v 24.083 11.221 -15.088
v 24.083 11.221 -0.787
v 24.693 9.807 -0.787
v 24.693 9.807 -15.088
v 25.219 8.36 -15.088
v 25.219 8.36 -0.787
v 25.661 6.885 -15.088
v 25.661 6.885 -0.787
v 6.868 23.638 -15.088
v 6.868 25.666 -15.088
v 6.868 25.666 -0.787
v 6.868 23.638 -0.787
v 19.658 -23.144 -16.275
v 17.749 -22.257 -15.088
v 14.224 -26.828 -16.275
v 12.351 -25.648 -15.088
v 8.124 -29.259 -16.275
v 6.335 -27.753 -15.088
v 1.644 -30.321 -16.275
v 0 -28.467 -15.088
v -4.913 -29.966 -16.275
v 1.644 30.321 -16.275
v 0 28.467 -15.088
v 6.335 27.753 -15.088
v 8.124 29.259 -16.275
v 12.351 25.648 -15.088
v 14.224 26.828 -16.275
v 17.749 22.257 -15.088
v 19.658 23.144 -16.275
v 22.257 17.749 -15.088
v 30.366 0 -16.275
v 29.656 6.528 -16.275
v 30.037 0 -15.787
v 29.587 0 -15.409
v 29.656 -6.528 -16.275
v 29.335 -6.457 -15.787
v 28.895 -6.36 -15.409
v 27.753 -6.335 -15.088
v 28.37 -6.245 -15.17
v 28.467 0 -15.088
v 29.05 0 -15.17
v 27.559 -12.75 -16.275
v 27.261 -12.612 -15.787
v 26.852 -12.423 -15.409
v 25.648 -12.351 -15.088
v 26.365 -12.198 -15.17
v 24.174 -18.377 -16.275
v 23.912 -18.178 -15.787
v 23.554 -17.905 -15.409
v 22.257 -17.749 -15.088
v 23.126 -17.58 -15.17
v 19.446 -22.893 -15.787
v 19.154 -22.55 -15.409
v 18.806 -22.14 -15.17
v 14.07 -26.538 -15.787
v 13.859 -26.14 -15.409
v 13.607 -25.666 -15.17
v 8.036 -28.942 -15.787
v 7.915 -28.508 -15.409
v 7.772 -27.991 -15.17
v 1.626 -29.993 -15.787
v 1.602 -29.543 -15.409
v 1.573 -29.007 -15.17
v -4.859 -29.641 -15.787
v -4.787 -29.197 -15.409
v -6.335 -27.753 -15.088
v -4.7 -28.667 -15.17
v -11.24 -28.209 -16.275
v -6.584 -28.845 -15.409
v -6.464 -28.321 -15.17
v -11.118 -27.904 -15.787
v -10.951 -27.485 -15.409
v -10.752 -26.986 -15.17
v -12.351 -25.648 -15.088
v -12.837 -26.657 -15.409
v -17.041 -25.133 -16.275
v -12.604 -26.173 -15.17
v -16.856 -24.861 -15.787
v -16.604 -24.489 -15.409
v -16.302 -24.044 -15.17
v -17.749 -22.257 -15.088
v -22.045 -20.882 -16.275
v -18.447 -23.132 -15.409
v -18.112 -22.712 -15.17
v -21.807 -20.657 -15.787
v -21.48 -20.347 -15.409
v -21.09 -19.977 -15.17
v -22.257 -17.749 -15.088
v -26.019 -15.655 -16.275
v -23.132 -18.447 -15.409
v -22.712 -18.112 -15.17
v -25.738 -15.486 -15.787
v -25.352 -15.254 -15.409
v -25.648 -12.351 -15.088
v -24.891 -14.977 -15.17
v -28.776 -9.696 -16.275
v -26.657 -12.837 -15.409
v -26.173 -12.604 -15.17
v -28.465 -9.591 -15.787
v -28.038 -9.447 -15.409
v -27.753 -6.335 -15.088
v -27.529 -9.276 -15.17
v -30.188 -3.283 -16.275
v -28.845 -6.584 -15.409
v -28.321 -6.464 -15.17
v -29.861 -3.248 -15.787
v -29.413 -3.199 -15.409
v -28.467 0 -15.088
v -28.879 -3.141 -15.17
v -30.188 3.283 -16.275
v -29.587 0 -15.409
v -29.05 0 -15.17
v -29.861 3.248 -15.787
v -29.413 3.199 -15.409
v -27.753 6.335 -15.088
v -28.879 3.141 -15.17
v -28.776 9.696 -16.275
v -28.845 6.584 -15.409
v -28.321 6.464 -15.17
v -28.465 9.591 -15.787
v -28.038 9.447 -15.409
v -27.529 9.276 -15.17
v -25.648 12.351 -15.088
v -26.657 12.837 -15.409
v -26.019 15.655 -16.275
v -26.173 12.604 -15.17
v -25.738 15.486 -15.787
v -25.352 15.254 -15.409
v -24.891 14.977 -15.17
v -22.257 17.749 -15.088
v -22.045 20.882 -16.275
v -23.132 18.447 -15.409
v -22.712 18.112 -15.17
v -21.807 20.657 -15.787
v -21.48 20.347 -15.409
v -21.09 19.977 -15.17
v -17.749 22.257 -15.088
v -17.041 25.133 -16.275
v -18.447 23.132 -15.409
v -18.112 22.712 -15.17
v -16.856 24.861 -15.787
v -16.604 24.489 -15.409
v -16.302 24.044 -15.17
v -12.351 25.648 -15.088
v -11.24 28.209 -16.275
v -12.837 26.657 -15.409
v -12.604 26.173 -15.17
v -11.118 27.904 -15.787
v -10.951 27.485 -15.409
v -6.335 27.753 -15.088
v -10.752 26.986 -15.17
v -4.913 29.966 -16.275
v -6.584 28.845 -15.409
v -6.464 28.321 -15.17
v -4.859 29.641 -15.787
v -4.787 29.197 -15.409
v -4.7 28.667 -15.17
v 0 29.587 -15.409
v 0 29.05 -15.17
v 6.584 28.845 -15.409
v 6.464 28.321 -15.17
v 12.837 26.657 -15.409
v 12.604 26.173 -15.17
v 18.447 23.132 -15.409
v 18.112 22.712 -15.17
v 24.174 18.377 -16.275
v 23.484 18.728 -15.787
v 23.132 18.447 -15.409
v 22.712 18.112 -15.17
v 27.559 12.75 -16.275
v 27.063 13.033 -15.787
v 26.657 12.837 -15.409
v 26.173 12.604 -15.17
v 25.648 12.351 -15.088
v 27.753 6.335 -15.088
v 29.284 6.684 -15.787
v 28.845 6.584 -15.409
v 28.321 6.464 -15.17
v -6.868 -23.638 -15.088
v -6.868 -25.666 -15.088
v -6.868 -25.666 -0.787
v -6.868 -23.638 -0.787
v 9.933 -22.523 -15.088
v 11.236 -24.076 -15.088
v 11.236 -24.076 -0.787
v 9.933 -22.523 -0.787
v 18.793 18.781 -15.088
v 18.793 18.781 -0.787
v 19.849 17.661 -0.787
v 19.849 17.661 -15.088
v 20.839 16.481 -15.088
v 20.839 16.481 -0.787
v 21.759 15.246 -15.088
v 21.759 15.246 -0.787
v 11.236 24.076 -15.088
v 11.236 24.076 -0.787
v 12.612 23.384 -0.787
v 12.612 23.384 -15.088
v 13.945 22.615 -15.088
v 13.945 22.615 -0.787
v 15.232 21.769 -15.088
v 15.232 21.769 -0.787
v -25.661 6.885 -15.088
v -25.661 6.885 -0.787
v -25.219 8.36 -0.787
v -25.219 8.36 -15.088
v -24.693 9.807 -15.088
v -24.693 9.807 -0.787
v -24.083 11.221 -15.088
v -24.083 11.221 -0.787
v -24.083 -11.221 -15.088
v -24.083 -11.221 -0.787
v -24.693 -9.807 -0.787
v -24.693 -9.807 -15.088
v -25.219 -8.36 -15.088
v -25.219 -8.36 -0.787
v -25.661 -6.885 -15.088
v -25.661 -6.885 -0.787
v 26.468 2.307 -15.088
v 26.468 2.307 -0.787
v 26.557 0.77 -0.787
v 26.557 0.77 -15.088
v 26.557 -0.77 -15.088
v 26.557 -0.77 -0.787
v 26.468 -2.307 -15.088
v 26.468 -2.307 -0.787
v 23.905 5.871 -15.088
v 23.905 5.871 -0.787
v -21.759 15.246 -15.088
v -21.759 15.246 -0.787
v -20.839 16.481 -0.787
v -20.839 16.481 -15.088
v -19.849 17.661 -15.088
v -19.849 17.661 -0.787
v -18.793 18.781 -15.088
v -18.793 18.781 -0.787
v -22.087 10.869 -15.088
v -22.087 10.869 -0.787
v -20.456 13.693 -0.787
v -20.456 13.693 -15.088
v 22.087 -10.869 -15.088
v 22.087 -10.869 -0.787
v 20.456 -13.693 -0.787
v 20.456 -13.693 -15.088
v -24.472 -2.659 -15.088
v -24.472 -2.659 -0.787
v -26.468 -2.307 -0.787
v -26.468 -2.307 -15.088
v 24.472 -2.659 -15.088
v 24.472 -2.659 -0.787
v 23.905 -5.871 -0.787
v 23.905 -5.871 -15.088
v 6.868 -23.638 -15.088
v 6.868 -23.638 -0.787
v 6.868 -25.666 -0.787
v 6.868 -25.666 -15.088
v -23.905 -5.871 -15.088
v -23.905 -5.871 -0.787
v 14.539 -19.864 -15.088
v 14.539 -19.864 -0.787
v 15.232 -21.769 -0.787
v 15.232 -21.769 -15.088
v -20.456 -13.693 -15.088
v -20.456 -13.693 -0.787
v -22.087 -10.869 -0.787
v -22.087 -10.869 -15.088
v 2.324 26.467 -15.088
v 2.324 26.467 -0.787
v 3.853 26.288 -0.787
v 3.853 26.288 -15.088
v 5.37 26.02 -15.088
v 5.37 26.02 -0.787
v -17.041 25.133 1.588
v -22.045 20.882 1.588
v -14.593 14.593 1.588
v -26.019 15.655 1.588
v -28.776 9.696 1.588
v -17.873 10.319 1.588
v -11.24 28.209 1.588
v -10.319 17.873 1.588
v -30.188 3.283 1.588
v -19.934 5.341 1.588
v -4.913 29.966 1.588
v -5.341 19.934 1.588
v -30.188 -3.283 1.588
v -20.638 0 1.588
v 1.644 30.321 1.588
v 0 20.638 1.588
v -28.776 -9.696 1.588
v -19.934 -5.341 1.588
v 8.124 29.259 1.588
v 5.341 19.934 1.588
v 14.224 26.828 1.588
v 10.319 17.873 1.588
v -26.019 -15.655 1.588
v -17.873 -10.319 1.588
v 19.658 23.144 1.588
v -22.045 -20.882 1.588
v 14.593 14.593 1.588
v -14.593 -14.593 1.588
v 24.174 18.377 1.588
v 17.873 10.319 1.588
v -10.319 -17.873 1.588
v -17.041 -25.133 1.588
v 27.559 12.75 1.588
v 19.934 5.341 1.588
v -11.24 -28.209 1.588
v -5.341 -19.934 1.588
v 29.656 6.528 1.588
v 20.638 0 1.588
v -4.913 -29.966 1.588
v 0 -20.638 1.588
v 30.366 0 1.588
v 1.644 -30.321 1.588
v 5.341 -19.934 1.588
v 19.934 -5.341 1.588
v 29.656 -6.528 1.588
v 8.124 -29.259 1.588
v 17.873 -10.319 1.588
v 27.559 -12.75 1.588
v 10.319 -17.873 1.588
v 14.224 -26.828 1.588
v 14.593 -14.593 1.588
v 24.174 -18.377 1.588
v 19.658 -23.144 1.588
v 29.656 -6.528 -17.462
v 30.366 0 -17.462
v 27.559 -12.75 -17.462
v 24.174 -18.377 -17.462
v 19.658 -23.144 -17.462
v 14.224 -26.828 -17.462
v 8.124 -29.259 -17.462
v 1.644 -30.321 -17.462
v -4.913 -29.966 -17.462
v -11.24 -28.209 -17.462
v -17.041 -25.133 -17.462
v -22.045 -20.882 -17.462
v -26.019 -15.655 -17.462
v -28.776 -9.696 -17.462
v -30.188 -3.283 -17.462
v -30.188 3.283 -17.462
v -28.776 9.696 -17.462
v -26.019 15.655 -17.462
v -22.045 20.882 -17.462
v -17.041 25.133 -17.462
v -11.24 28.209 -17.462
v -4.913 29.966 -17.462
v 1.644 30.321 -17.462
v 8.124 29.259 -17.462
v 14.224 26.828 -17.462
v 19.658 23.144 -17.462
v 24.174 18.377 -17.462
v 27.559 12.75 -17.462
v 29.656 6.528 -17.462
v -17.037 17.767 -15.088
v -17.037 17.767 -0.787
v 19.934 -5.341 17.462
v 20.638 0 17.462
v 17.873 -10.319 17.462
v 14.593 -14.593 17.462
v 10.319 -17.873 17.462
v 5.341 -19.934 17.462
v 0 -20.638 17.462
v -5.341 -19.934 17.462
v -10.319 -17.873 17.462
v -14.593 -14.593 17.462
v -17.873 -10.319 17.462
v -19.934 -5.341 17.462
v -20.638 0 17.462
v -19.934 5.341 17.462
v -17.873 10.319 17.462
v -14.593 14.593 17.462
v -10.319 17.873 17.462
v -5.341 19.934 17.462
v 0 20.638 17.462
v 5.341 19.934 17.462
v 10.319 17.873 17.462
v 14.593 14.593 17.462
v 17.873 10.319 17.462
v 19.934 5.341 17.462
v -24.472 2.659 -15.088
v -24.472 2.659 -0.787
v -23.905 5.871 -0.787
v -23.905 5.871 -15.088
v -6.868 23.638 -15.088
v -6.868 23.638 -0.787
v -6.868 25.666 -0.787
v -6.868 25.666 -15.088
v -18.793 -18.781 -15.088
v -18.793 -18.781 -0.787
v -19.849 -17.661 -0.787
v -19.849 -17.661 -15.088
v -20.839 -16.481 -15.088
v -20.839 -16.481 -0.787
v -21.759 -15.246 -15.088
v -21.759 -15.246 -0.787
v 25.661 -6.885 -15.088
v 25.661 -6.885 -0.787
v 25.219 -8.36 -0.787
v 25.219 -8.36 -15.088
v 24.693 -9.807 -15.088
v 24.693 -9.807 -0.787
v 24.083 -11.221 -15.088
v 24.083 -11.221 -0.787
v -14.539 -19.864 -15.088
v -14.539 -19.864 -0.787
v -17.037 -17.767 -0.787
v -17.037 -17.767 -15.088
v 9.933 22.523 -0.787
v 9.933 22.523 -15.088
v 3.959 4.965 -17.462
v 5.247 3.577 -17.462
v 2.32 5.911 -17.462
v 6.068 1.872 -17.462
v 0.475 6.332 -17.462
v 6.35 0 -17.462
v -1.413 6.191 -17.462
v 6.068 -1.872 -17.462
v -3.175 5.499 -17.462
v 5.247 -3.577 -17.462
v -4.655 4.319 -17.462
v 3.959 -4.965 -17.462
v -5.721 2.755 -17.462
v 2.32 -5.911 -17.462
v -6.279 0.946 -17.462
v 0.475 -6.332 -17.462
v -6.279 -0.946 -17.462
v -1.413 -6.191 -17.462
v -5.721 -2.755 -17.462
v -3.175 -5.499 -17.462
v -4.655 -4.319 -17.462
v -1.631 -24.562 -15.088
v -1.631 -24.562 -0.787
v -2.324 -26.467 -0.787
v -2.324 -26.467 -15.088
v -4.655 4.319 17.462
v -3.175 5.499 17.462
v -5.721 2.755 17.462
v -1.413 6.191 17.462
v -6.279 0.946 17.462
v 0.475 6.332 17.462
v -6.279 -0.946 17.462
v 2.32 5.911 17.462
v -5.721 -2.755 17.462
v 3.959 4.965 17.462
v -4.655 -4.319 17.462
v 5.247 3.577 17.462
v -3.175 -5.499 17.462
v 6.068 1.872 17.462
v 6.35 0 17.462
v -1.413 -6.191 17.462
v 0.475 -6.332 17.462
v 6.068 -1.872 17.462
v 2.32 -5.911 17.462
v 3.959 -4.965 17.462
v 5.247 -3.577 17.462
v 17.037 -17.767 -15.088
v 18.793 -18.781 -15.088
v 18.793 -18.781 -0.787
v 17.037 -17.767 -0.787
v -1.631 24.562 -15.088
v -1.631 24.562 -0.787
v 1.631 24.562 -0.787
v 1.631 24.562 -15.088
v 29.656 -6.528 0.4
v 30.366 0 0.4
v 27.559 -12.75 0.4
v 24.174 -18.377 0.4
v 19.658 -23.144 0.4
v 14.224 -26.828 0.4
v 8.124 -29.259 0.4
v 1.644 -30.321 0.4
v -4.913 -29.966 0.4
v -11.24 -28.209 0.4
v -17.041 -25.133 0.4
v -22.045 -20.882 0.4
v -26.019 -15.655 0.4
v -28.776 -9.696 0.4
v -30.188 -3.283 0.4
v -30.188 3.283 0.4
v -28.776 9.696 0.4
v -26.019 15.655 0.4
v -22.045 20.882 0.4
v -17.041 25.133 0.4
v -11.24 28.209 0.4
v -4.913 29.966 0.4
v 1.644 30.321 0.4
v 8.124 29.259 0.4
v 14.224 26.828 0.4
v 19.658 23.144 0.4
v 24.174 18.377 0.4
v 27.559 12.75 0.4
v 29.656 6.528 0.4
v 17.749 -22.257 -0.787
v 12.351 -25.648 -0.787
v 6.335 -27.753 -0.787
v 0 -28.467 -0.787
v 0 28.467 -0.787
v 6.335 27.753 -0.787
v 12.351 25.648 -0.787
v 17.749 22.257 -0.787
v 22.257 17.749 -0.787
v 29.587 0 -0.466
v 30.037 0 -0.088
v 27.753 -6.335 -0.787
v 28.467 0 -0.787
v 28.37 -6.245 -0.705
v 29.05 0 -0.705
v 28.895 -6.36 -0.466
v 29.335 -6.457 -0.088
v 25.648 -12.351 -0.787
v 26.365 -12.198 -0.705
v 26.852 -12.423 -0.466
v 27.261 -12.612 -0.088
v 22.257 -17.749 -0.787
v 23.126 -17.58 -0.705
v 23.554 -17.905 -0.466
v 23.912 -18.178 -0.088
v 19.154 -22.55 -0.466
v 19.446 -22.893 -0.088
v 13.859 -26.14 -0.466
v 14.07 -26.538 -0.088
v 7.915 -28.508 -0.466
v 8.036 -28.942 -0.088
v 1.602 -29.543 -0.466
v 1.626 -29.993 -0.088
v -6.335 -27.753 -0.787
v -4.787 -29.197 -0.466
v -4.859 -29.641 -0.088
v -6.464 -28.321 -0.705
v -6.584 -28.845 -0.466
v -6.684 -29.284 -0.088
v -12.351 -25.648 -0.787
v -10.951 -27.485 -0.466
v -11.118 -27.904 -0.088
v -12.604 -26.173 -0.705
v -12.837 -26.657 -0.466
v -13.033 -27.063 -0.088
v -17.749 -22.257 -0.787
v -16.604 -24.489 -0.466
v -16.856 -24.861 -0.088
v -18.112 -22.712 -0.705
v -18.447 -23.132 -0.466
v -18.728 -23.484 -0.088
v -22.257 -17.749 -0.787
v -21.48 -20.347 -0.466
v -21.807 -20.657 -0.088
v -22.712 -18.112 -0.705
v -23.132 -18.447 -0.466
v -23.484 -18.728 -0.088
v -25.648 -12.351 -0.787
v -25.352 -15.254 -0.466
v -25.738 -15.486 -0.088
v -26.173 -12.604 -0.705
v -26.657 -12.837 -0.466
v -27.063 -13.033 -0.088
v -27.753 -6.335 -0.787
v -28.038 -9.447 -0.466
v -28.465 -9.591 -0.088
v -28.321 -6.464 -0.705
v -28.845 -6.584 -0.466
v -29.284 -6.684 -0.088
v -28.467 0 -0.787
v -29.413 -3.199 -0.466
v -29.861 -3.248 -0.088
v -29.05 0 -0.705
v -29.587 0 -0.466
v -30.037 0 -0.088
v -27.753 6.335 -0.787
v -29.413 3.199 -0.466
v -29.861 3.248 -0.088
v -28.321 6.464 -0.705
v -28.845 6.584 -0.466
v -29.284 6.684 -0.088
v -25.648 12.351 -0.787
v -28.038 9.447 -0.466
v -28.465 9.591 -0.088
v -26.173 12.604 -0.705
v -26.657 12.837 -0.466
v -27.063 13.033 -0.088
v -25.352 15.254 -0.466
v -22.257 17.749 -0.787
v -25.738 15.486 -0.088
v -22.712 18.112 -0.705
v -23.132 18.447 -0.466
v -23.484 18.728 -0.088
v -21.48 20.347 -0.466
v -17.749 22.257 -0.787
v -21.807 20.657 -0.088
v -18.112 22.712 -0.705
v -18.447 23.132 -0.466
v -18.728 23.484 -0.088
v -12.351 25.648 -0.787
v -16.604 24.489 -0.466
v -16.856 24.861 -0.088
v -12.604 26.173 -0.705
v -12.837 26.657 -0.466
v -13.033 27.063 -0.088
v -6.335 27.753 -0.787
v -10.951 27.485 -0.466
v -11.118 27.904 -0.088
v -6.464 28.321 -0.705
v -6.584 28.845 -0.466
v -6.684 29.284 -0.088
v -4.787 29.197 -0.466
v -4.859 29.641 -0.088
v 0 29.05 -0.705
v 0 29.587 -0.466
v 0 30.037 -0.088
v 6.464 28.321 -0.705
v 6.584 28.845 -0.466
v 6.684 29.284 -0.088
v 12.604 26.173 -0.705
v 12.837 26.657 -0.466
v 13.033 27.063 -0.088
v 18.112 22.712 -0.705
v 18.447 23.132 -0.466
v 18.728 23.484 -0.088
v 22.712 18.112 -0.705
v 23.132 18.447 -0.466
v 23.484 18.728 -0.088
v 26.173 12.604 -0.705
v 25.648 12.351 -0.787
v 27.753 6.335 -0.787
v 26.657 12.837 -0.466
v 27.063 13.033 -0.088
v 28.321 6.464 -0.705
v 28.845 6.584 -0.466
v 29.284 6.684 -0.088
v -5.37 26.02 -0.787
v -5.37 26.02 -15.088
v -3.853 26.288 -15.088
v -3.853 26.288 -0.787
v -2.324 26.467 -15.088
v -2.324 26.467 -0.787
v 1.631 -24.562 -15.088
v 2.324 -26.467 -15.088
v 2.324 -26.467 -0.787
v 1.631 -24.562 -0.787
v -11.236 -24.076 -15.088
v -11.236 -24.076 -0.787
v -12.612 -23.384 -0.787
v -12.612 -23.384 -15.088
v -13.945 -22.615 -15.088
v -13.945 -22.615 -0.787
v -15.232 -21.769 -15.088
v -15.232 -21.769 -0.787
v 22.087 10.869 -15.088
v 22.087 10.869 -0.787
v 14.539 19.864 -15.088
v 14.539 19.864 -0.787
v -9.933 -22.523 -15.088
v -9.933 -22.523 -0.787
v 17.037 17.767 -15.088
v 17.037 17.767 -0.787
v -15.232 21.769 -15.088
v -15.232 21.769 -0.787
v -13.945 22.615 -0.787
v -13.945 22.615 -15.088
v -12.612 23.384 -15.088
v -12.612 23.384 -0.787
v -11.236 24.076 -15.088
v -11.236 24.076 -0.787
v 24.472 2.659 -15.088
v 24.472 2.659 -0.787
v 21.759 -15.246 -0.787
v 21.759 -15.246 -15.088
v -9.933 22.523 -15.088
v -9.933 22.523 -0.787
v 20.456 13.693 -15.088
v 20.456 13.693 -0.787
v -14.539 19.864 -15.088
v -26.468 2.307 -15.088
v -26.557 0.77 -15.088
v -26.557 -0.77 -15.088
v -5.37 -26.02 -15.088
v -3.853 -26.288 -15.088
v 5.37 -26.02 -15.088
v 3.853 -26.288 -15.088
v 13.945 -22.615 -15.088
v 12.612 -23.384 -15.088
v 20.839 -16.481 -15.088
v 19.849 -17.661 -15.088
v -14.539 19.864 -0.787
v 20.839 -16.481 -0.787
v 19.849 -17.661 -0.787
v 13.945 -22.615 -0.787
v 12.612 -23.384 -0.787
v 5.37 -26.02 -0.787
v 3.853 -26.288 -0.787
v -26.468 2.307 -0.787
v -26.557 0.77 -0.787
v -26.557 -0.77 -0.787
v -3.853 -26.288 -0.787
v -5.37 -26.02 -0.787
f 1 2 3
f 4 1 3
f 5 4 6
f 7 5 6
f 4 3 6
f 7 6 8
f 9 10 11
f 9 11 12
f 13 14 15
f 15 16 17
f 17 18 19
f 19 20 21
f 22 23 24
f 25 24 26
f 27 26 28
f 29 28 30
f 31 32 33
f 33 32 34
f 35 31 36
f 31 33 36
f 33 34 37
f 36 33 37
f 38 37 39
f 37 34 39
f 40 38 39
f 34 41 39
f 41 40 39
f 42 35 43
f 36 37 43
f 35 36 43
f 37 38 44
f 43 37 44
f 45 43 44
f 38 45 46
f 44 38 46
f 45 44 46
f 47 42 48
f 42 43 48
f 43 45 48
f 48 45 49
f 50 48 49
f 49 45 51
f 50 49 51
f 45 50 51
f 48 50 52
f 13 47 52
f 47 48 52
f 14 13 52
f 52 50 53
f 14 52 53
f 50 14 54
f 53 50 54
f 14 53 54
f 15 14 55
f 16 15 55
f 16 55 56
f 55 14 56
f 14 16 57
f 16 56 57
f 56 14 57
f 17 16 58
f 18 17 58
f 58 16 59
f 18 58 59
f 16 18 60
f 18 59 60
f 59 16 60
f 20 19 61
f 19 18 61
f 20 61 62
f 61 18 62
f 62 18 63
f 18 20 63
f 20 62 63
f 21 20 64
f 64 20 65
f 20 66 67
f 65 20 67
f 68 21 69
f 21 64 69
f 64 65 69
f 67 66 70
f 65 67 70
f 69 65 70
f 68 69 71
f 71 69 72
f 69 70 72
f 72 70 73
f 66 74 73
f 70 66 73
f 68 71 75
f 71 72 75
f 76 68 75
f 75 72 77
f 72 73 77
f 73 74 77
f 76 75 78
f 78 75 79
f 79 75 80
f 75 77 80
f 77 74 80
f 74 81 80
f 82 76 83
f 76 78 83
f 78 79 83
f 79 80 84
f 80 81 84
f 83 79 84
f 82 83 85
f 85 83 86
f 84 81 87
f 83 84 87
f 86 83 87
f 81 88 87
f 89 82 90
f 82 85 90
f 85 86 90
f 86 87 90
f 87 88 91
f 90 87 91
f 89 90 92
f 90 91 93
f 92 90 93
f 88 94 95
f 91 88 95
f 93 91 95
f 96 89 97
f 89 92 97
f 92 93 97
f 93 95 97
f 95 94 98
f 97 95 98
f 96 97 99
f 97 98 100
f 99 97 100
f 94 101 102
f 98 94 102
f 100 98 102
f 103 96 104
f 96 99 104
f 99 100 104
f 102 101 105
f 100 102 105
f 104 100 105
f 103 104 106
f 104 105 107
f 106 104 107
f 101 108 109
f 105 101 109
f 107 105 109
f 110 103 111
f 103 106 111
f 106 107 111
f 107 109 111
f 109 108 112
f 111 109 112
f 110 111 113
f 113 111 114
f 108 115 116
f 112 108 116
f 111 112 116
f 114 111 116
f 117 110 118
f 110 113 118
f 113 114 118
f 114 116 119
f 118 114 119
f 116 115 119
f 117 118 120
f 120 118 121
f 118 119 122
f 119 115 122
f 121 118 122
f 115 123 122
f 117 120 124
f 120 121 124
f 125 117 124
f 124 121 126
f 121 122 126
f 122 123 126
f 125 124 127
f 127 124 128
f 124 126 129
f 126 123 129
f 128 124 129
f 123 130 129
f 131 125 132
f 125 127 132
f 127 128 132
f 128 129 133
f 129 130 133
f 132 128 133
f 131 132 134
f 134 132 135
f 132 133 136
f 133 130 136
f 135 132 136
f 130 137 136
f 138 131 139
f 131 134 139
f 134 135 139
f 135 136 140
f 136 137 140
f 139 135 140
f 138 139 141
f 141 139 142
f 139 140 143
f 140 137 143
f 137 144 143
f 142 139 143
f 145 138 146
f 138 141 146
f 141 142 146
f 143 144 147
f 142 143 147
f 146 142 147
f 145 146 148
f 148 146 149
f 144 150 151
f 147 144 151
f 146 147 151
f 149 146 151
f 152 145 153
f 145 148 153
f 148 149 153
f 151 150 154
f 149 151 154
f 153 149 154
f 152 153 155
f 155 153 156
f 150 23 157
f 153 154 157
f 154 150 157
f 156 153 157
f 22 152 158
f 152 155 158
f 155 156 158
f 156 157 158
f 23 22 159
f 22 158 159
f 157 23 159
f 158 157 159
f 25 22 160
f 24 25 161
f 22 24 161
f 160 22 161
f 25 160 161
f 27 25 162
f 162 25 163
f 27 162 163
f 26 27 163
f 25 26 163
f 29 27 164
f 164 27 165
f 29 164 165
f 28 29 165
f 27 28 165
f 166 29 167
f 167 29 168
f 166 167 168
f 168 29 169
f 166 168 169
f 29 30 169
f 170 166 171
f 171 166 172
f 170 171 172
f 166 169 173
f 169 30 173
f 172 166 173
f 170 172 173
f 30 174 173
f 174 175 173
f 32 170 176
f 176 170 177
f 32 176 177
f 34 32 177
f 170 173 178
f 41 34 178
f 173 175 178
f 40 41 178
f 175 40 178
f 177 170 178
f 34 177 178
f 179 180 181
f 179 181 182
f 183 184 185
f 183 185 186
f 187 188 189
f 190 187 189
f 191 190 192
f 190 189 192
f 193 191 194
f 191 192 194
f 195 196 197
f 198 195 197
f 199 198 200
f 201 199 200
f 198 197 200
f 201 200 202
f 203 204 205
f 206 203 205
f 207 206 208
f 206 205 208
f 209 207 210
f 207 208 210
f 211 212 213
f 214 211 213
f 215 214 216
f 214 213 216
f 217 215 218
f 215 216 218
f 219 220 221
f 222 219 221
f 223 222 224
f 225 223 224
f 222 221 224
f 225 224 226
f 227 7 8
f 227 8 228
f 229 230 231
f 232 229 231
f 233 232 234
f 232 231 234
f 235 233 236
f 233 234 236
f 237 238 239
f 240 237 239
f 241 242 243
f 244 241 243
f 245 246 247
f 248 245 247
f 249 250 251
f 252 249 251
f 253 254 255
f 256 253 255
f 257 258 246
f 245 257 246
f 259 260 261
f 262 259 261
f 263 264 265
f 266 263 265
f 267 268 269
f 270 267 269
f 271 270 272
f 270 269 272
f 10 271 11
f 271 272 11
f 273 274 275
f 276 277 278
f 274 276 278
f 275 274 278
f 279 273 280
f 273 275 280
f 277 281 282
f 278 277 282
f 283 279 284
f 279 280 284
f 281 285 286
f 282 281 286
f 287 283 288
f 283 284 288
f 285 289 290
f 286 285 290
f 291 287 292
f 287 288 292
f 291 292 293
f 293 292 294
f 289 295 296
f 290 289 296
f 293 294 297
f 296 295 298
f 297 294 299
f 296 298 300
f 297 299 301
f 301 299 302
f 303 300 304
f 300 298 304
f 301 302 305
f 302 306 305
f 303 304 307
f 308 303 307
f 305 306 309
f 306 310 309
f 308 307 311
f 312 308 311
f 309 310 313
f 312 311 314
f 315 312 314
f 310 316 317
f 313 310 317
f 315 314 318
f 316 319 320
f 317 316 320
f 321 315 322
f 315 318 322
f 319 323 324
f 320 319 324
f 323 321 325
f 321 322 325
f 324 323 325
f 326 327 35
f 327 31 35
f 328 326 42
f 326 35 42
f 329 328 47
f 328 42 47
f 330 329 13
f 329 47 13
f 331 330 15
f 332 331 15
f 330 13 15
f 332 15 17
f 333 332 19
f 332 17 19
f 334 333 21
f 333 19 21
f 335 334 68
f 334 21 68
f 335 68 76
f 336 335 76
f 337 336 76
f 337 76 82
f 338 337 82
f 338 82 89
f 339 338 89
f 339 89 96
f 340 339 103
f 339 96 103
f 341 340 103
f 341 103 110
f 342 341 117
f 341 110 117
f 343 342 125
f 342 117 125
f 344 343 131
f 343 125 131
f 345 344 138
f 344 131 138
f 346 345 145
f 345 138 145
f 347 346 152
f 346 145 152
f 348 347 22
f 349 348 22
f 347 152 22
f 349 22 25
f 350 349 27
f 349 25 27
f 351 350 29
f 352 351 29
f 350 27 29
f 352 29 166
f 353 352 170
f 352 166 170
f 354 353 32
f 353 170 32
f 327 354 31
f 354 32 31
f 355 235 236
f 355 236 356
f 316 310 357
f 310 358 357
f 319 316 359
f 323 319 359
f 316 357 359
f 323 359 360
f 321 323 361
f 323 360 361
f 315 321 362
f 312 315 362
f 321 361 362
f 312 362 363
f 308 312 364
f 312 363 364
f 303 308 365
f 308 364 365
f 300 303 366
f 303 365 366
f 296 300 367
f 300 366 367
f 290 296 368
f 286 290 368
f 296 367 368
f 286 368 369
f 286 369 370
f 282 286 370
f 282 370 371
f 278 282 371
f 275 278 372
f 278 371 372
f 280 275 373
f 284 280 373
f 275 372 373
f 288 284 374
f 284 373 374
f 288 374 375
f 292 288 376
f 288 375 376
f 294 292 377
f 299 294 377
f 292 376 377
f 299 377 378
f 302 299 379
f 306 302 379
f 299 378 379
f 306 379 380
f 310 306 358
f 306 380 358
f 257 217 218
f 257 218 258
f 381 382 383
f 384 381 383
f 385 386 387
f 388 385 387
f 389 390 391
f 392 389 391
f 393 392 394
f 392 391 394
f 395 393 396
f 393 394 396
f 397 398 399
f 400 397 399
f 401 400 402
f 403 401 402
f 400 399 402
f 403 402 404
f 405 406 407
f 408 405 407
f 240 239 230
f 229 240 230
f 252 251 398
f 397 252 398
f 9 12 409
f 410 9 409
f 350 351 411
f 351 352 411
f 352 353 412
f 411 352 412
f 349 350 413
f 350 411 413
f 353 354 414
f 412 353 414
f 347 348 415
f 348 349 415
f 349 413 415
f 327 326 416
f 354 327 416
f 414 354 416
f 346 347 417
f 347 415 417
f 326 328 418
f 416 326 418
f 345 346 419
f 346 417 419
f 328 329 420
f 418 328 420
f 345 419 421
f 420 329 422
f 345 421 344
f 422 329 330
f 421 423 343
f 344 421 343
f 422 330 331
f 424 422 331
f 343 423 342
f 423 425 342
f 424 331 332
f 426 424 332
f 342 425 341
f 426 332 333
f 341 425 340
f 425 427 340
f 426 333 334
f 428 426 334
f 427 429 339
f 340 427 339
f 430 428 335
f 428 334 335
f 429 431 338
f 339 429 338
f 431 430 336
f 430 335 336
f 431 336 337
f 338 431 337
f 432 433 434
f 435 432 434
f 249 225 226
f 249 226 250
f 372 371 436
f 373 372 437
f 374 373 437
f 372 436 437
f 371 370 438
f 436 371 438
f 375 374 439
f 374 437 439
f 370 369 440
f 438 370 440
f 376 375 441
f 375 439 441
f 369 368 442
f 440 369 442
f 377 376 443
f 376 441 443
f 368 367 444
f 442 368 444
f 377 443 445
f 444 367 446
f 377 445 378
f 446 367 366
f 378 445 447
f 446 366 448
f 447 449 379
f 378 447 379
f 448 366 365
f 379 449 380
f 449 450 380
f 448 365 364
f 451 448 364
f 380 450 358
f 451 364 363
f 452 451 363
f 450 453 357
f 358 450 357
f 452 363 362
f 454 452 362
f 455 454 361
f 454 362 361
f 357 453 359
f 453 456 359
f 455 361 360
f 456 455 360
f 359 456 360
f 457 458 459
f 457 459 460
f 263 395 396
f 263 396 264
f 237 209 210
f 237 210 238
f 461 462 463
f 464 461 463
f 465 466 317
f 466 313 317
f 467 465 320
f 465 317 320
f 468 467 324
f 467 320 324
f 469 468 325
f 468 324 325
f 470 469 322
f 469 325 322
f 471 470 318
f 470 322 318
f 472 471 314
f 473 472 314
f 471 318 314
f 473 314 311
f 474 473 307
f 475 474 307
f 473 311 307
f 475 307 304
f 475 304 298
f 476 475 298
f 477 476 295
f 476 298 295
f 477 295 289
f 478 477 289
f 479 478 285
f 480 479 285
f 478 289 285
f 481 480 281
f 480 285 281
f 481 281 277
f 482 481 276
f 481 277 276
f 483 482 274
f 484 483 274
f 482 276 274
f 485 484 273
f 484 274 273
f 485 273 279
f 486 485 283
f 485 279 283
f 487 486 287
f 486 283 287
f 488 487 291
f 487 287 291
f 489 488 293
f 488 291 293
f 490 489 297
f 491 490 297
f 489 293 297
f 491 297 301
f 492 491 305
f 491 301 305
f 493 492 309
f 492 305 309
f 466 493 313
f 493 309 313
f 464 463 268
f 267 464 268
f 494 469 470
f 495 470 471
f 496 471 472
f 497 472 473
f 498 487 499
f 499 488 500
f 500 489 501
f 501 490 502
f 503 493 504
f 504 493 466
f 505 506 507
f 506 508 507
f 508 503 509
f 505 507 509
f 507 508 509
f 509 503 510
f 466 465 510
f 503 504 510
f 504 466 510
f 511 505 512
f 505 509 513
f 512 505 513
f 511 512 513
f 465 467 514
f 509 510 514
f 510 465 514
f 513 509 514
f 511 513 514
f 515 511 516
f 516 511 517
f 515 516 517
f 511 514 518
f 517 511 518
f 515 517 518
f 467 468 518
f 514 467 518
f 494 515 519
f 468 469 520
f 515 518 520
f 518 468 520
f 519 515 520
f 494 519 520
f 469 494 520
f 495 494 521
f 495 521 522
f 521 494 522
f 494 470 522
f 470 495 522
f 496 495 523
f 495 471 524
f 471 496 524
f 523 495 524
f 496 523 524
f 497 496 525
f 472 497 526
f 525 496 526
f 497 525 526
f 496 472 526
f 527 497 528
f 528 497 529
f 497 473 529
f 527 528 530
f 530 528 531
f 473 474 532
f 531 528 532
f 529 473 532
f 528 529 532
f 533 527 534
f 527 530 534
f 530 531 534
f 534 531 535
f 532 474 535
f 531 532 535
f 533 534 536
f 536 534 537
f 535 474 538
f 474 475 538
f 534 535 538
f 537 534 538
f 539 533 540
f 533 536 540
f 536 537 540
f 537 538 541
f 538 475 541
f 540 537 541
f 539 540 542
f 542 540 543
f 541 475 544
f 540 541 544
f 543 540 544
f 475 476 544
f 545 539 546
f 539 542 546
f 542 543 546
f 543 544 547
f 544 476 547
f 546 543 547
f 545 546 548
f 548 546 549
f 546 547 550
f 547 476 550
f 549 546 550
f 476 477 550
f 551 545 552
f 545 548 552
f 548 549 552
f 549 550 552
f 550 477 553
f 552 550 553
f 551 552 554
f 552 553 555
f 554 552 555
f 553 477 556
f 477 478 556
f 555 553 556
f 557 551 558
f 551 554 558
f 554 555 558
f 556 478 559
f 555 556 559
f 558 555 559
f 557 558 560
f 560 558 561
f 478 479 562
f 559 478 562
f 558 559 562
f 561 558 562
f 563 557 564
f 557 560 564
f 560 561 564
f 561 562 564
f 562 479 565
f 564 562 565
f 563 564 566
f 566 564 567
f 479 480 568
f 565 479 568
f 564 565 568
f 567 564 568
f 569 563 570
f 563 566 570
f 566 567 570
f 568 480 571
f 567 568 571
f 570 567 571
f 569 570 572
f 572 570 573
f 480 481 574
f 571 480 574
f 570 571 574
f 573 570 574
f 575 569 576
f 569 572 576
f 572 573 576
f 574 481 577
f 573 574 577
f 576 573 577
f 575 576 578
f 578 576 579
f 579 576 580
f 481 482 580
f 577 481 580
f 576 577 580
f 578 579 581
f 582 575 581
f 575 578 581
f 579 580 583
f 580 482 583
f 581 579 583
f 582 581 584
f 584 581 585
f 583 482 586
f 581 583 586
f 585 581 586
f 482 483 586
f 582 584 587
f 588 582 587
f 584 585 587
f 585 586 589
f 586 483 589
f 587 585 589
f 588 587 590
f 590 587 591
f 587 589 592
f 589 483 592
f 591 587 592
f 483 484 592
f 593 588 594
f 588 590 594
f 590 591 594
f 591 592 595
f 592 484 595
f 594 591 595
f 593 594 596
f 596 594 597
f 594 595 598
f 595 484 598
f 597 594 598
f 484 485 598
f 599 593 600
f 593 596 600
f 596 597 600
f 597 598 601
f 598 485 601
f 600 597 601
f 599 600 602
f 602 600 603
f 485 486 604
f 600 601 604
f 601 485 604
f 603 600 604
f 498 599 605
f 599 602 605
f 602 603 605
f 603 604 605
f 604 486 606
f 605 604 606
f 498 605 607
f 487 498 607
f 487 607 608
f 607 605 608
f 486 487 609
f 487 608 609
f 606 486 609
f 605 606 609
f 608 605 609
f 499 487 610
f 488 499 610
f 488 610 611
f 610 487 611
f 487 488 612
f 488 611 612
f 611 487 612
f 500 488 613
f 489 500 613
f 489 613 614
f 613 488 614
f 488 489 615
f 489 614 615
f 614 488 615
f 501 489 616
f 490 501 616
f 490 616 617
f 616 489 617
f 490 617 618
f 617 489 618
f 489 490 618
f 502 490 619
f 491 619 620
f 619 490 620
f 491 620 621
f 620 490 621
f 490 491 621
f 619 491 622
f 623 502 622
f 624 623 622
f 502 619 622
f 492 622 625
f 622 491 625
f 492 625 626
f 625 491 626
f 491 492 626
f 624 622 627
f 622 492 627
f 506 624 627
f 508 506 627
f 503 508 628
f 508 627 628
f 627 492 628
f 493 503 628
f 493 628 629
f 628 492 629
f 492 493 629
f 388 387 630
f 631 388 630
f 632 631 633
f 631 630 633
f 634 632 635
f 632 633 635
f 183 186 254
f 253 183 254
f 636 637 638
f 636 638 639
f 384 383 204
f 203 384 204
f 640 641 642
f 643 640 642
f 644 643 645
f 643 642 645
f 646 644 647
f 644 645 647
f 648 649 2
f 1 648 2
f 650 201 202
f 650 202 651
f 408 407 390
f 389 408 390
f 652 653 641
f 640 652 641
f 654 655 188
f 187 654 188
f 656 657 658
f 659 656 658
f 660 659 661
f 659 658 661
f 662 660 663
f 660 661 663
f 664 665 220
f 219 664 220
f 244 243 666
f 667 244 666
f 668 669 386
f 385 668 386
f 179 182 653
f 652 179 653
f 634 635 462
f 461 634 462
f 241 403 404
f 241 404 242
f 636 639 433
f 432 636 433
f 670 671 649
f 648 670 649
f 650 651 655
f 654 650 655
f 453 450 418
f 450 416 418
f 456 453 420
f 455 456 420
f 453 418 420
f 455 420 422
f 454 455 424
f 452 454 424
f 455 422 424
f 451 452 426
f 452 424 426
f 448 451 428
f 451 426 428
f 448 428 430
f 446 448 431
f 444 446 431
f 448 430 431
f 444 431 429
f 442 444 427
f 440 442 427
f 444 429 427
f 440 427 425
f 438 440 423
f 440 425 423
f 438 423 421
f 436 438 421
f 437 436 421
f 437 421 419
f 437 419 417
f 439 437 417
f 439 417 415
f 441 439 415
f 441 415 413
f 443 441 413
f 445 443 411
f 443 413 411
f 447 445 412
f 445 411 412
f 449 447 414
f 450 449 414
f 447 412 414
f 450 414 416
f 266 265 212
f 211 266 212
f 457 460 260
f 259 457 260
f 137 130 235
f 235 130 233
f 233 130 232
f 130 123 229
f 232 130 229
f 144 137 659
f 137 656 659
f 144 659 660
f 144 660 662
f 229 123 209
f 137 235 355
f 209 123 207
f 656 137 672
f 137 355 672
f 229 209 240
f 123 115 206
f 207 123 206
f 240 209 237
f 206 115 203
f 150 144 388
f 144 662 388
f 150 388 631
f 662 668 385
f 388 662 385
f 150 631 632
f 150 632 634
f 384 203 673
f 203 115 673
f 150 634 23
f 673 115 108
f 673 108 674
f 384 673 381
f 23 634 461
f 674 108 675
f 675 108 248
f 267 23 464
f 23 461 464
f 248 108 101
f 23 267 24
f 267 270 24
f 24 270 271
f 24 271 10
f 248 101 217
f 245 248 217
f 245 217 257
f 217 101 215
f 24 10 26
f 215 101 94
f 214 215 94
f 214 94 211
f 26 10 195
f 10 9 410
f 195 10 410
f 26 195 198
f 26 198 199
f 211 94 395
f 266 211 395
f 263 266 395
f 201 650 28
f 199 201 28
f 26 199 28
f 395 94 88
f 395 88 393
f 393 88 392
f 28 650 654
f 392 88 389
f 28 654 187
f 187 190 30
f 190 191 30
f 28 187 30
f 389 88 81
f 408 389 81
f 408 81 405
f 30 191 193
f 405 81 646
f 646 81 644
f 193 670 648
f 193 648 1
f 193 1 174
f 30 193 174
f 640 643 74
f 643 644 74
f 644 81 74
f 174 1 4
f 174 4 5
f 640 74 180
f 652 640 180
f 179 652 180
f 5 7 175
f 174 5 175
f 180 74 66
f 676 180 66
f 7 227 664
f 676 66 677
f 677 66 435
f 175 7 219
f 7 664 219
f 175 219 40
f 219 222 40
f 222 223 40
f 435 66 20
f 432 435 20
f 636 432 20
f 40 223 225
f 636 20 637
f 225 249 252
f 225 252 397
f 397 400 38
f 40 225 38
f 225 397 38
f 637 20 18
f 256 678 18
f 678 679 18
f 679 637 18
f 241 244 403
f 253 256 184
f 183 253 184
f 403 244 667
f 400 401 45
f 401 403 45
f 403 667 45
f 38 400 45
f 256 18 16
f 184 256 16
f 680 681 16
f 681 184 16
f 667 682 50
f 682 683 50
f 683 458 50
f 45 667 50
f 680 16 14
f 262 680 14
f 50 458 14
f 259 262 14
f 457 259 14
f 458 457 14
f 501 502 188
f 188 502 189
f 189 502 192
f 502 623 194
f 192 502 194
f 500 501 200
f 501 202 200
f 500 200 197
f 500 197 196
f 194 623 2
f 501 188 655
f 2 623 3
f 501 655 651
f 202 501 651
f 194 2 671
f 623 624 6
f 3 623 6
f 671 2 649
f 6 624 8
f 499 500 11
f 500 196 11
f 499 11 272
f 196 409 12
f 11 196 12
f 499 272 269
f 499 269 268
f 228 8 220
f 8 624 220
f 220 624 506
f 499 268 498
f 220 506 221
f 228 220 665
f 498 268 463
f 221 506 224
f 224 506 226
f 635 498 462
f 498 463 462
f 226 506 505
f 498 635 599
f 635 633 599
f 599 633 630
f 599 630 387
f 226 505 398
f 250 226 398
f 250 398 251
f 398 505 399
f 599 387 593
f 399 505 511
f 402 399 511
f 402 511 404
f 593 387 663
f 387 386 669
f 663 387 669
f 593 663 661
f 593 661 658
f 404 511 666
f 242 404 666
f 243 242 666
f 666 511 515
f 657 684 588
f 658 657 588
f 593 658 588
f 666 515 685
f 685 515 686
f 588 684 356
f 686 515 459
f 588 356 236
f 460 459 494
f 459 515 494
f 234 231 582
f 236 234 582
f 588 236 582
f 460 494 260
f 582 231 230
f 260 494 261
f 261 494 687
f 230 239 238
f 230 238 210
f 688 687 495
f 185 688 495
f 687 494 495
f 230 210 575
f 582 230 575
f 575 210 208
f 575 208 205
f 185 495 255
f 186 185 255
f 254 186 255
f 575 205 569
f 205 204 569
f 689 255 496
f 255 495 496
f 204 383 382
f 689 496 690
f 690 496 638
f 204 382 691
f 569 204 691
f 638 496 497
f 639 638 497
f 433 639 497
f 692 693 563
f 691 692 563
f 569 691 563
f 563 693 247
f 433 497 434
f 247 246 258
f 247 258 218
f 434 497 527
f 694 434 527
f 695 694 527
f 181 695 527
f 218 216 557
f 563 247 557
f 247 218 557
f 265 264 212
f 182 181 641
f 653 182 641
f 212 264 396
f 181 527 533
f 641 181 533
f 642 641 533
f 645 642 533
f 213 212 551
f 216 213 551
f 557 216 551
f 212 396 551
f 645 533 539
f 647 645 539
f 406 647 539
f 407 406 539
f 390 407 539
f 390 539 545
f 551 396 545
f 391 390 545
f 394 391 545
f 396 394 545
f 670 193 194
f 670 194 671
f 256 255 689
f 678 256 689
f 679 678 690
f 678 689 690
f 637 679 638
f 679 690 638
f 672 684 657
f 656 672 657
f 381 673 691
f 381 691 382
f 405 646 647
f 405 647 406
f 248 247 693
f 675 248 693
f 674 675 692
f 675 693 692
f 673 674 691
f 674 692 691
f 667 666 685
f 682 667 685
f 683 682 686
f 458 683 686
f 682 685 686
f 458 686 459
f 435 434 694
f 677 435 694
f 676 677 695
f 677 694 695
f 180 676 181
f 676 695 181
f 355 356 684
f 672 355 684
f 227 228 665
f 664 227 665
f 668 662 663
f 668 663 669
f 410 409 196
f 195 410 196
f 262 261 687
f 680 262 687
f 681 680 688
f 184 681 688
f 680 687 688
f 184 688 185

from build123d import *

# Parameters (mm, degrees)
CUT_EXTRUDE1_START = -0.7874
CUT_EXTRUDE1_DEPTH = 14.3002
CIRPATTERN1_COUNT  = 18


with BuildPart() as part:
    # Sketch2 → Revolve1 (revolve)
    with BuildSketch(Plane(origin=(0, 0, 0), x_dir=(0, 0, -1), z_dir=(1, 0, 0)), mode=Mode.PRIVATE) as revolve1_sk:
        with BuildLine():
            Line((-17.4625, 6.35), (17.4625, 6.35))
            Line((17.4625, 6.35), (17.4625, 30.3657))
            Line((17.4625, 30.3657), (16.27505, 30.3657))
            ThreePointArc((16.27505, 30.3657), (15.408910445, 29.58682048), (15.0876, 28.467172932))
            Line((15.0876, 28.467172932), (15.0876, 26.568645864))
            Line((15.0876, 26.568645864), (0.7874, 26.568645864))
            Line((0.7874, 26.568645864), (0.7874, 28.467172932))
            ThreePointArc((0.7874, 28.467172932), (0.466089555, 29.58682048), (-0.40005, 30.3657))
            Line((-0.40005, 30.3657), (-1.5875, 30.3657))
            Line((-1.5875, 30.3657), (-1.5875, 20.6375))
            Line((-1.5875, 20.6375), (-17.4625, 20.6375))
            Line((-17.4625, 20.6375), (-17.4625, 6.35))
        make_face()
    revolve(revolve1_sk.sketch.rotate(Axis((0, 0, 17.4625), (0, 0, -1)), 90), axis=Axis((0, 0, 17.4625), (0, 0, -1)))

    # Sketch3 → Cut-Extrude1 (cut)
    with BuildSketch(Plane.XY.offset(CUT_EXTRUDE1_START)):
        with BuildLine():
            Line((-1.630736704, 24.5618), (1.630736704, 24.5618))
            Line((1.630736704, 24.5618), (2.3241, 26.4668))
            ThreePointArc((2.3241, 26.4668), (0, 26.568645864), (-2.3241, 26.4668))
            Line((-2.3241, 26.4668), (-1.630736704, 24.5618))
        make_face()
    cut_extrude1 = extrude(amount=-CUT_EXTRUDE1_DEPTH, mode=Mode.SUBTRACT)

    # CirPattern1: Cut-Extrude1 ×18 about axis
    cirpattern1_axis = Axis((0, 0, 0), (0, 0, 1))
    for i in range(1, CIRPATTERN1_COUNT):
        add(cut_extrude1.rotate(cirpattern1_axis, i * 360 / CIRPATTERN1_COUNT), mode=Mode.SUBTRACT)


solid = part.part
